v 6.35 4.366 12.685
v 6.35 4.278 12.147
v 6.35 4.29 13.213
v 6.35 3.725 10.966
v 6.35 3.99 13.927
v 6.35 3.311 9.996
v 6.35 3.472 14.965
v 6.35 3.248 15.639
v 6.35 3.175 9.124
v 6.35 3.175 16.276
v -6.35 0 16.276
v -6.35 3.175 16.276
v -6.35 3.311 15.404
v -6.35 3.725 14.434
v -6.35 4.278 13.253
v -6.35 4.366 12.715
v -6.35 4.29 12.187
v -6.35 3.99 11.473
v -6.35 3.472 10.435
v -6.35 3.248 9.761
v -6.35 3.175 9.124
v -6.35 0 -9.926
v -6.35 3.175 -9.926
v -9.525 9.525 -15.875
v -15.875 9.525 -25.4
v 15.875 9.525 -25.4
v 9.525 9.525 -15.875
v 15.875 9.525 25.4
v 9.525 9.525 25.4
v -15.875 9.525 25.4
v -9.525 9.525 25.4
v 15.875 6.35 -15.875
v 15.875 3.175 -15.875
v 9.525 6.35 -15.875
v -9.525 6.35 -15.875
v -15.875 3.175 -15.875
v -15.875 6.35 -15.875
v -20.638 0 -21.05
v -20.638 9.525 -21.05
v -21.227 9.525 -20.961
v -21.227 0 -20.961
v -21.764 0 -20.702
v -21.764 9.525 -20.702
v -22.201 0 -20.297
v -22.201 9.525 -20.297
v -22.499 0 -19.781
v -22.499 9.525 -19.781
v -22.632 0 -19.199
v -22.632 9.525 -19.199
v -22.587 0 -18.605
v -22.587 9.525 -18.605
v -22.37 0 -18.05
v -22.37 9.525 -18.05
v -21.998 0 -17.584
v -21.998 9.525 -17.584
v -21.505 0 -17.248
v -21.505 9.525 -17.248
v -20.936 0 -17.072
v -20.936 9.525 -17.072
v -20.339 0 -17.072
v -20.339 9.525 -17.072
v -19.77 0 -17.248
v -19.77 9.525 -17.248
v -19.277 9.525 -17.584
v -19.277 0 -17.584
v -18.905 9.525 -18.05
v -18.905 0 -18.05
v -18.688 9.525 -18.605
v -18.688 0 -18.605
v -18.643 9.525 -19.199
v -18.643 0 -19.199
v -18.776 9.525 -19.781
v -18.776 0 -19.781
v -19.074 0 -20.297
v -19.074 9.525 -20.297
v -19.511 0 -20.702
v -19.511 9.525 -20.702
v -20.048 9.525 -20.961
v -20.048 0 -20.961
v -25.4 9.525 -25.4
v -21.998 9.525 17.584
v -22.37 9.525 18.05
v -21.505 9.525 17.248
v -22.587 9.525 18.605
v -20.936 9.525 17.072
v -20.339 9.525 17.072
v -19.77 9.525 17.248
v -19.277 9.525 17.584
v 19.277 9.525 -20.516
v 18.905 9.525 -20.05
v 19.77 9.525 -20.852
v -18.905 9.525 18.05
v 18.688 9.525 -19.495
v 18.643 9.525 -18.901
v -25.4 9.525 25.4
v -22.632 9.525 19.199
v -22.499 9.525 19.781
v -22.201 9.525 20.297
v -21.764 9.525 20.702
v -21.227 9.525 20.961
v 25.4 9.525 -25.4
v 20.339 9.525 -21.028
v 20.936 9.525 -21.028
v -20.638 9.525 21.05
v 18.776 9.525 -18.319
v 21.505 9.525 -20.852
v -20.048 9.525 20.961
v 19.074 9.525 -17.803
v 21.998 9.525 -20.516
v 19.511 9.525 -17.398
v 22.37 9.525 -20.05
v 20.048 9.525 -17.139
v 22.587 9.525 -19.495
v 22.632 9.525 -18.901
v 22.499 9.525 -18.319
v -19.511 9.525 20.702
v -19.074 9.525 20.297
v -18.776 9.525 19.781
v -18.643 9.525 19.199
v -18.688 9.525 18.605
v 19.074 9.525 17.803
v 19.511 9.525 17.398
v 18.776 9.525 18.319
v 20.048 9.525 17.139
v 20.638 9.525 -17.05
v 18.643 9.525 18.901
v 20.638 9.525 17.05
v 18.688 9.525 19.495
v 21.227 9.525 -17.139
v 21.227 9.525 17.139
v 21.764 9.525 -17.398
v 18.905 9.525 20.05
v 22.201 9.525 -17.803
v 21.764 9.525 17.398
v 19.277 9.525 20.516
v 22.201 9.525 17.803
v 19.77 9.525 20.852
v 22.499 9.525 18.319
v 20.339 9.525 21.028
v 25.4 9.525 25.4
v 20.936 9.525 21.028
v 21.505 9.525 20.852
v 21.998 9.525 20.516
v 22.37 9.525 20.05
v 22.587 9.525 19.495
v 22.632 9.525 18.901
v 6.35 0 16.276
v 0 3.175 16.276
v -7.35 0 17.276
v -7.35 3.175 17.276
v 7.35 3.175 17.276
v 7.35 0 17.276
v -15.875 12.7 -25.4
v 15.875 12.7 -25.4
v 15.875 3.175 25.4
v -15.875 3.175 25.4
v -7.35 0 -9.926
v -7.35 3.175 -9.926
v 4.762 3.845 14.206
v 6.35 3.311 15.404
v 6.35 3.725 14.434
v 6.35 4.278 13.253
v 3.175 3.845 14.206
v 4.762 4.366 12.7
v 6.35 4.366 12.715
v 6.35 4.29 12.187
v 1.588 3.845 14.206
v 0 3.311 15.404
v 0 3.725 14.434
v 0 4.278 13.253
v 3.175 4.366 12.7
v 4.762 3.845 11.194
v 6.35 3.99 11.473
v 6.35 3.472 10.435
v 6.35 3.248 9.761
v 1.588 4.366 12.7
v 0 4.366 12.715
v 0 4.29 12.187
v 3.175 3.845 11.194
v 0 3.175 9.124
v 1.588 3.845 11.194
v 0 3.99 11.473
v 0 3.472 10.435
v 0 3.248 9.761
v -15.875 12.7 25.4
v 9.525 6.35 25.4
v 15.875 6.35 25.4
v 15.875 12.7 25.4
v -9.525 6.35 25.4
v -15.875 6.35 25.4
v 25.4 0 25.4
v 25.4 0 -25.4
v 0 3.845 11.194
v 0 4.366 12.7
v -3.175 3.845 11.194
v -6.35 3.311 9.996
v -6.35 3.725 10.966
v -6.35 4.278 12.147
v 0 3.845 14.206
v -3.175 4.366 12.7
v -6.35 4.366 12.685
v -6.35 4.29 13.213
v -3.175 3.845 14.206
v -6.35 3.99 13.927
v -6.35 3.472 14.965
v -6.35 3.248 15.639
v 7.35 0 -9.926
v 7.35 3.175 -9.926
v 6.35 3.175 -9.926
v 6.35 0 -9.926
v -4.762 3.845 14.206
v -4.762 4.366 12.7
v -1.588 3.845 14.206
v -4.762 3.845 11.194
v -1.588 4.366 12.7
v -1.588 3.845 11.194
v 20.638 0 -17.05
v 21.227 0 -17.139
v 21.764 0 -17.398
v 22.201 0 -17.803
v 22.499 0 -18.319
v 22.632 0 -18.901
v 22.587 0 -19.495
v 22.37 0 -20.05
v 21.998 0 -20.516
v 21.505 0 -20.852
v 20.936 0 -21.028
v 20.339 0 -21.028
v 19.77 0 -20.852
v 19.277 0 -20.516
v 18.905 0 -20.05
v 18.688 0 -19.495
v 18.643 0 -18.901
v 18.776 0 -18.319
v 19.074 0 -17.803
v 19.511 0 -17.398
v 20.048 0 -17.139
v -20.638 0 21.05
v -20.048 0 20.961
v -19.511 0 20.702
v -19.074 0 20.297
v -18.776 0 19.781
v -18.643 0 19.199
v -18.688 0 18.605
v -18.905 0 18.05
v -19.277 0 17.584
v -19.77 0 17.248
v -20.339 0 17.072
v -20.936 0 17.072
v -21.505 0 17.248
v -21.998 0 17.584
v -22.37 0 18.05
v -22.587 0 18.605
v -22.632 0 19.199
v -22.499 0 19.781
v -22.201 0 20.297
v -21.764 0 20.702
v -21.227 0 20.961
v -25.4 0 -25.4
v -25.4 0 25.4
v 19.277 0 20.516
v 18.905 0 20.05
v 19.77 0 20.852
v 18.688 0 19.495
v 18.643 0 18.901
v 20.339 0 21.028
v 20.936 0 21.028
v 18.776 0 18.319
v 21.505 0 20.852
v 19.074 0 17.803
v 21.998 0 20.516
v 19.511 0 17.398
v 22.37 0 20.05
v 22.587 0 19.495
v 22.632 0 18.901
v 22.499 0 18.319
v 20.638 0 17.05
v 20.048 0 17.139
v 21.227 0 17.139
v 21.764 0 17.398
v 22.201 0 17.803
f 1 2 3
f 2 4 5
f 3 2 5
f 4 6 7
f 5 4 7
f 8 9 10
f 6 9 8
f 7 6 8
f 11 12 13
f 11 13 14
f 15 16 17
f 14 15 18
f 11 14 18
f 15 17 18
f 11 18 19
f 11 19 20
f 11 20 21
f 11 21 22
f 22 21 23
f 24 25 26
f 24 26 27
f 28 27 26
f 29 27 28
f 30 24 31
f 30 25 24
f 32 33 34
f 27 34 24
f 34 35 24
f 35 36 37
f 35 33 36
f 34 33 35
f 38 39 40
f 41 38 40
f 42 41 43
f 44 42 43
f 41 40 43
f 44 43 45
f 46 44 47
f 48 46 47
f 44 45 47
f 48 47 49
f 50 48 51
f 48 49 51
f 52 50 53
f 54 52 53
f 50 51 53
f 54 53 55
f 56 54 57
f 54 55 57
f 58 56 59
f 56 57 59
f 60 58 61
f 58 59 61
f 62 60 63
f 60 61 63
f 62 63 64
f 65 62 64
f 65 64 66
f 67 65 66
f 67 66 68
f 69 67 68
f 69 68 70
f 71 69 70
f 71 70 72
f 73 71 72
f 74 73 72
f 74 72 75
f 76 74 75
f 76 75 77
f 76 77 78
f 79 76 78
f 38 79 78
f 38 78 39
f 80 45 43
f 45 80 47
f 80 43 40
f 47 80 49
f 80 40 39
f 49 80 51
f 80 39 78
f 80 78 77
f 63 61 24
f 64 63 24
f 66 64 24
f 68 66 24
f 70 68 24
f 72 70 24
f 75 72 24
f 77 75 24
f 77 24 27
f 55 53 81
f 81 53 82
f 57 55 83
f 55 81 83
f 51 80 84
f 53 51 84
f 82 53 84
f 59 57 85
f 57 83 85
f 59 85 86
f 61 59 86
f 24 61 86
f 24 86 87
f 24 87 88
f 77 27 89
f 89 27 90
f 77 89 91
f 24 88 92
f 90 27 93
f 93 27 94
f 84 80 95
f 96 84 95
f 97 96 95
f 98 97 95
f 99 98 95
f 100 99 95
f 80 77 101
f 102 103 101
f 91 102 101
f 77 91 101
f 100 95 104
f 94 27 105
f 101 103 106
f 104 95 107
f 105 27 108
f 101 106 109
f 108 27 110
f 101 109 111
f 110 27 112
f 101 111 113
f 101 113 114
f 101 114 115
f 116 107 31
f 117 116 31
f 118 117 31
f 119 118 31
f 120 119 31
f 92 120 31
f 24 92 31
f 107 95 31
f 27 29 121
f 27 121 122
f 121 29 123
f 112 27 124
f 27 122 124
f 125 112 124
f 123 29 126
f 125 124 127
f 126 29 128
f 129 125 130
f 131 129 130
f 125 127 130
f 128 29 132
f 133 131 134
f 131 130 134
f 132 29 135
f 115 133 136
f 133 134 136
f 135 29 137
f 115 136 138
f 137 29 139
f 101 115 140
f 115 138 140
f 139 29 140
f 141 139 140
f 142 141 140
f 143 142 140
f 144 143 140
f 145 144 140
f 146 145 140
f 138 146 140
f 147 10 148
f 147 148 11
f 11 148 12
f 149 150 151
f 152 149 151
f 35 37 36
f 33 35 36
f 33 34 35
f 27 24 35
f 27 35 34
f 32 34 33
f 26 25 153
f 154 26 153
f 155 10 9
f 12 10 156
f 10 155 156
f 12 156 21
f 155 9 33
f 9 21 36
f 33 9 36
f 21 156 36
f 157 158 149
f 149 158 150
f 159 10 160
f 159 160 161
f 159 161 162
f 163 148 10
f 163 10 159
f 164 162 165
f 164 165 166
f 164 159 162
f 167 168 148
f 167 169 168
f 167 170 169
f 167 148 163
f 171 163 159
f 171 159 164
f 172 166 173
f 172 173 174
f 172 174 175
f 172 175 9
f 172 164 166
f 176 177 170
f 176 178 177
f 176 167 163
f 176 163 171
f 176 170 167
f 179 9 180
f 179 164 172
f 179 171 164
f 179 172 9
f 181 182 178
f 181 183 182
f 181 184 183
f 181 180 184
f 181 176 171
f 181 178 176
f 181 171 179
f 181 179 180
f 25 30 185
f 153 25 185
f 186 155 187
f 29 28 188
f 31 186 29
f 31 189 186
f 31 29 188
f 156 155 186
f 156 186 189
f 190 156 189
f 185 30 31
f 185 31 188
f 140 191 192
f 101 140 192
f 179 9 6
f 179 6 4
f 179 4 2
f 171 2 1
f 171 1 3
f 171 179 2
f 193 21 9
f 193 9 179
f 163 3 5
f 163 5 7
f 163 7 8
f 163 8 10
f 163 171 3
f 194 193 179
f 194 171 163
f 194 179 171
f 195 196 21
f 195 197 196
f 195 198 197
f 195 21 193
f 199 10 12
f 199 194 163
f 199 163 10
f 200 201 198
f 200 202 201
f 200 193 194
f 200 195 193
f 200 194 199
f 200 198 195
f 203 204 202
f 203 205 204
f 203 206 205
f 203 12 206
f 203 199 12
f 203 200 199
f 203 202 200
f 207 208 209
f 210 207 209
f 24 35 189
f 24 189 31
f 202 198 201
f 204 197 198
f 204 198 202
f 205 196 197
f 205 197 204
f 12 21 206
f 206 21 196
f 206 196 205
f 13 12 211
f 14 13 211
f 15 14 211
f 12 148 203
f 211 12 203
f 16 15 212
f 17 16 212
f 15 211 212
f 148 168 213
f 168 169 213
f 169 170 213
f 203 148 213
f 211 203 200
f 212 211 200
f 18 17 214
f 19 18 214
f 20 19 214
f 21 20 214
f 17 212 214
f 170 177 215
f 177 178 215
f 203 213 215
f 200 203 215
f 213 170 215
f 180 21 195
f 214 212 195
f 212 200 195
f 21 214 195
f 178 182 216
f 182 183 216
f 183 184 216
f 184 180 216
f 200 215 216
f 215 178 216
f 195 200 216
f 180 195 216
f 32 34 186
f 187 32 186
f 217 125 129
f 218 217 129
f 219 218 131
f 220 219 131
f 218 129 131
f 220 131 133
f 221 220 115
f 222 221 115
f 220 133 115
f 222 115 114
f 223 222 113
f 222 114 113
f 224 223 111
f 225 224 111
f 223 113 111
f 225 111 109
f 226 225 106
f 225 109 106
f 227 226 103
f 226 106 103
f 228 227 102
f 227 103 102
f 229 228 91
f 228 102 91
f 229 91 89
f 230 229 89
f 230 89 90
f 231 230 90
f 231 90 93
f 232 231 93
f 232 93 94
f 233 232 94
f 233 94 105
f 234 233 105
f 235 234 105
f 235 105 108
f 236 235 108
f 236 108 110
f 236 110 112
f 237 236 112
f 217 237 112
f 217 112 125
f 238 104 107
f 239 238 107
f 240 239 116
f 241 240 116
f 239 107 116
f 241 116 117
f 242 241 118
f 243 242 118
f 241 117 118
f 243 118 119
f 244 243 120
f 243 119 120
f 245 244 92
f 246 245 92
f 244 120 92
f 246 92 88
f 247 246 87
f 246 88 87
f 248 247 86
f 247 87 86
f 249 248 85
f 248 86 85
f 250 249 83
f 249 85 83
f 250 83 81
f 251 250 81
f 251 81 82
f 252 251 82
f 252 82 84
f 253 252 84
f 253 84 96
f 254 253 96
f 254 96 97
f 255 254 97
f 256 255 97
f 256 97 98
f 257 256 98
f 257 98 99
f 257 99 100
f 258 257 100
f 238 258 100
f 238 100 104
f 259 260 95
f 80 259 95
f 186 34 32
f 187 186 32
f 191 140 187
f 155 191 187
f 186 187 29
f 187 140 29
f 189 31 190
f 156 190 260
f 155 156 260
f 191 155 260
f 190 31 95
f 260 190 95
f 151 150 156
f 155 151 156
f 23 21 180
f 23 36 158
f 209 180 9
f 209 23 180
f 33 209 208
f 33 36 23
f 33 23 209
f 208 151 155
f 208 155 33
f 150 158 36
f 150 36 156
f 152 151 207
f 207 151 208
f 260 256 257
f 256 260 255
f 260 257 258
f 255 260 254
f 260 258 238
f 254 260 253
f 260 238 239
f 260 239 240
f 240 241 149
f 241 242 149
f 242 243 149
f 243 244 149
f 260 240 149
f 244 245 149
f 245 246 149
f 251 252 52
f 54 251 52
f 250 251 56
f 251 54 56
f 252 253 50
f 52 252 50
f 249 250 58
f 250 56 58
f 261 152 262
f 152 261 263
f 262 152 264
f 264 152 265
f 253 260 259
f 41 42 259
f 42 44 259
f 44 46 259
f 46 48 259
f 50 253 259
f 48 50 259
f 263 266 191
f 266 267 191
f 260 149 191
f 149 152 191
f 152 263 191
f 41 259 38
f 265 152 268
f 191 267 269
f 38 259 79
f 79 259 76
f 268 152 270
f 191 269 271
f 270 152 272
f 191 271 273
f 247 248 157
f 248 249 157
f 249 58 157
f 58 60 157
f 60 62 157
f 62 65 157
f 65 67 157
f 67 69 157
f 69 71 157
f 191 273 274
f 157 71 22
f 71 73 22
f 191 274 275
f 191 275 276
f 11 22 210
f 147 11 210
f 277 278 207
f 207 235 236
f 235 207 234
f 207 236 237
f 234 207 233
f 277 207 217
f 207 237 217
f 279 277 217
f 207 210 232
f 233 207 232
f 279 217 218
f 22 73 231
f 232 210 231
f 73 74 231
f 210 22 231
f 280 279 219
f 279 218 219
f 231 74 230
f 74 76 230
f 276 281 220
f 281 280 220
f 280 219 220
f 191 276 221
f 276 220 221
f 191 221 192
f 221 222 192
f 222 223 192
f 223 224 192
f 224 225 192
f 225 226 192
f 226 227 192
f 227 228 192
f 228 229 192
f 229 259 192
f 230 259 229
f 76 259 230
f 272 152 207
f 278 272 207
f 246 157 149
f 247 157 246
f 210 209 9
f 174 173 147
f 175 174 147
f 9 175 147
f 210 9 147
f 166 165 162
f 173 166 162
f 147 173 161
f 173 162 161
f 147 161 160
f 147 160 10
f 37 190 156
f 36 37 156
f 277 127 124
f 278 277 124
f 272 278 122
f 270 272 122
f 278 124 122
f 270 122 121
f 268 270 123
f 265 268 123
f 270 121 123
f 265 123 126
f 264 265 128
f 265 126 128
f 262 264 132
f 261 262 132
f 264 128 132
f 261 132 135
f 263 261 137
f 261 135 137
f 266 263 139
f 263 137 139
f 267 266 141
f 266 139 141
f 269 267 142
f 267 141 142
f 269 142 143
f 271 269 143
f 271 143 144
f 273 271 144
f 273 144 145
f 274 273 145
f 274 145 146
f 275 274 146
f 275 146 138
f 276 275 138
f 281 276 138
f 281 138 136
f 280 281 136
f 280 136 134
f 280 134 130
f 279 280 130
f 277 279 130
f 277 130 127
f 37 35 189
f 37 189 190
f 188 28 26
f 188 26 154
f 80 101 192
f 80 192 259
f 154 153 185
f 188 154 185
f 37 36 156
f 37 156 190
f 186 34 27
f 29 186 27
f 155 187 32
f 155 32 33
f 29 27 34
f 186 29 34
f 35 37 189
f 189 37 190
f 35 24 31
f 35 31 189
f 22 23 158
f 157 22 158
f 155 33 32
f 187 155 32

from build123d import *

# Parameters (mm, degrees)
SKETCH1_W              = 50.8
SKETCH1_H              = 50.8
BOSS_EXTRUDE1_DEPTH    = 3.175
BOSS_EXTRUDE5_DEPTH    = 6.35
CUT_EXTRUDE1_DEPTH     = 37.061067996
BOSS_EXTRUDE2_DEPTH    = 50.8
BOSS_EXTRUDE6_REACH    = 39.162
SKETCH10_W             = 50.8
SKETCH10_H             = 9.525
SKETCH12_R             = 2
CUT_EXTRUDE2_DEPTH     = 38.162422242
SKETCH15_W             = 31.75
SKETCH15_H             = 41.275
BOSS_EXTRUDE8_DEPTH    = 6.35
SKETCH16_W             = 31.75
SKETCH16_H             = 50.8
BOSS_EXTRUDE9_DEPTH    = 3.175
INTERSECT4_START       = -15.875
INTERSECT4_OUTLINE_W   = 3.175
INTERSECT4_OUTLINE_H   = 50.8
INTERSECT4_DEPTH       = 31.75
INTERSECT4_START_2     = -9.525
INTERSECT4_2_OUTLINE_W = 3.175
INTERSECT4_2_OUTLINE_H = 41.275
INTERSECT4_2_DEPTH     = 19.05
INTERSECT4_3_DEPTH     = 9.525
INTERSECT4_START_3     = 6.35
INTERSECT4_4_DEPTH     = 9.525
INTERSECT4_5_OUTLINE_R = 2
INTERSECT4_5_DEPTH     = 9.525
INTERSECT4_6_OUTLINE_W = 31.75
INTERSECT4_6_OUTLINE_H = 41.275
INTERSECT4_6_DEPTH     = 3.175


with BuildPart() as part:
    # Sketch1 → Boss-Extrude1 (new body)
    with BuildSketch(Plane(origin=(0, 0, 0), x_dir=(1, 0, 0), z_dir=(0, 1, 0))):
        Rectangle(SKETCH1_W, SKETCH1_H)
    extrude(amount=BOSS_EXTRUDE1_DEPTH)

    # Sketch7 → Boss-Extrude5 (add, symmetric)
    with BuildSketch(Plane(origin=(0, 0, 0), x_dir=(0, 0, -1), z_dir=(1, 0, 0))):
        with BuildLine():
            Line((-16.276050722, 3.175), (-9.123949278, 3.175))
            add(Edge.make_bspline(
                [(-16.276050722, 3.175), (-13.736050722, 3.175), (-12.7, 6.35), (-11.663949278, 3.175), (-9.123949278, 3.175)],
                knots=[0, 0, 0, 0, 0, 1, 1, 1, 1, 1], degree=4))
        make_face()
    extrude(amount=BOSS_EXTRUDE5_DEPTH, both=True)

    # Sketch8 → Cut-Extrude1 (cut, through all)
    with BuildSketch(Plane(origin=(0, 3.175, 0), x_dir=(1, 0, 0), z_dir=(0, 1, 0))):
        Polygon((-6.35, -16.276050722), (-6.35, -9.123949278), (-6.35, 9.926050722), (-7.35, 9.926050722), (-7.35, -9.123949278), (-7.35, -17.276050722), (7.35, -17.276050722), (7.35, -9.123949278), (7.35, 9.926050722), (6.35, 9.926050722), (6.35, -9.123949278), (6.35, -16.276050722), align=None)
    extrude(amount=-CUT_EXTRUDE1_DEPTH, mode=Mode.SUBTRACT)

    # Sketch3 → Boss-Extrude2 (add)
    with BuildSketch(Plane.XY.offset(25.4)):
        Polygon((-15.875, 3.175), (-25.4, 3.175), (-25.4, 9.525), (-9.525, 9.525), (-9.525, 6.35), (-15.875, 6.35), align=None)
        Polygon((9.525, 6.35), (15.875, 6.35), (15.875, 3.175), (25.4, 3.175), (25.4, 9.525), (9.525, 9.525), align=None)
    extrude(amount=-BOSS_EXTRUDE2_DEPTH)

    # Boss-Extrude6: up to this face of the body (flat: up to its plane)
    boss_extrude6_end = Plane(part.part.faces().sort_by_distance((0, 3.175, -1.076695791))[0])
    # Sketch10 → Boss-Extrude6 (add, up to the picked face)
    with BuildSketch(Plane(origin=(0, 9.525, 0), x_dir=(1, 0, 0), z_dir=(0, 1, 0)), mode=Mode.PRIVATE) as boss_extrude6_sk1:
        with Locations((0, 20.6375)):
            Rectangle(SKETCH10_W, SKETCH10_H)
    boss_extrude6_tool1 = split(extrude(boss_extrude6_sk1.sketch, amount=-BOSS_EXTRUDE6_REACH, mode=Mode.PRIVATE), bisect_by=boss_extrude6_end, keep=Keep.BOTH, mode=Mode.PRIVATE)
    add(boss_extrude6_tool1.solids().sort_by(Axis((0, 9.525, -20.6375), (0, -1, 0)))[0])

    # Sketch12 → Cut-Extrude2 (cut, through all)
    with BuildSketch(Plane(origin=(0, 9.525, 0), x_dir=(1, 0, 0), z_dir=(0, 1, 0))):
        with Locations(Location((-20.6375, -19.05, 0), (0, 0, 270))):
            Circle(SKETCH12_R)
        with Locations(Location((20.6375, -19.05, 0), (0, 0, 90))):
            Circle(SKETCH12_R)
        with Locations(Location((20.6375, 19.05, 0), (0, 0, 270))):
            Circle(SKETCH12_R)
        with Locations(Location((-20.6375, 19.05, 0), (0, 0, 90))):
            Circle(SKETCH12_R)
    extrude(amount=-CUT_EXTRUDE2_DEPTH, mode=Mode.SUBTRACT)


with BuildPart() as body_2:
    # Sketch15 → Boss-Extrude8 (new body)
    with BuildSketch(Plane(origin=(0, 3.175, 0), x_dir=(1, 0, 0), z_dir=(0, 1, 0))):
        with Locations((0, -4.7625)):
            Rectangle(SKETCH15_W, SKETCH15_H)
    extrude(amount=BOSS_EXTRUDE8_DEPTH)

    # Sketch16 → Boss-Extrude9 (add)
    with BuildSketch(Plane(origin=(0, 9.525, 0), x_dir=(1, 0, 0), z_dir=(0, 1, 0))):
        Rectangle(SKETCH16_W, SKETCH16_H)
    extrude(amount=BOSS_EXTRUDE9_DEPTH)


with BuildPart() as body_3:
    # Intersect4: read off the stored shape, not the designer's step
    # Intersect4 outline → Intersect4 (new body)
    with BuildSketch(Plane.YZ.offset(INTERSECT4_START)):
        with BuildLine():
            add(Edge.make_bspline(
                [(3.175, 9.123949278), (3.175, 11.663949278), (6.35, 12.7), (3.175, 13.736050722), (3.175, 16.276050722)],
                knots=[0, 0, 0, 0, 0, 1, 1, 1, 1, 1], degree=4))
            Line((3.175, 9.123949278), (3.175, -15.875))
            Line((3.175, -15.875), (6.35, -15.875))
            Line((6.35, -15.875), (6.35, 25.4))
            Line((6.35, 25.4), (3.175, 25.4))
            Line((3.175, 25.4), (3.175, 16.276050722))
        make_face()
        with Locations((11.1125, 0)):
            Rectangle(INTERSECT4_OUTLINE_W, INTERSECT4_OUTLINE_H)
    extrude(amount=INTERSECT4_DEPTH)

    # Intersect4 2 outline → Intersect4 2 (add)
    with BuildSketch(Plane.YZ.offset(INTERSECT4_START_2)):
        with Locations((7.9375, 4.7625)):
            Rectangle(INTERSECT4_2_OUTLINE_W, INTERSECT4_2_OUTLINE_H)
    extrude(amount=INTERSECT4_2_DEPTH)

    # Intersect4 3 outline → Intersect4 3 (add)
    with BuildSketch(Plane.YZ.offset(INTERSECT4_START)):
        with BuildLine():
            Line((3.175, 16.276050722), (3.175, 9.123949278))
            add(Edge.make_bspline(
                [(3.175, 9.123949278), (3.175, 11.663949278), (6.35, 12.7), (3.175, 13.736050722), (3.175, 16.276050722)],
                knots=[0, 0, 0, 0, 0, 1, 1, 1, 1, 1], degree=4))
        make_face()
    extrude(amount=INTERSECT4_3_DEPTH)

    # Intersect4 4 outline → Intersect4 4 (add)
    with BuildSketch(Plane.YZ.offset(INTERSECT4_START_3)):
        with BuildLine():
            Line((3.175, 16.276050722), (3.175, 9.123949278))
            add(Edge.make_bspline(
                [(3.175, 9.123949278), (3.175, 11.663949278), (6.35, 12.7), (3.175, 13.736050722), (3.175, 16.276050722)],
                knots=[0, 0, 0, 0, 0, 1, 1, 1, 1, 1], degree=4))
        make_face()
    extrude(amount=INTERSECT4_4_DEPTH)


with BuildPart() as body_4:
    # Intersect4 5 outline → Intersect4 5 (new body)
    with BuildSketch(Plane(origin=(0, 0, 0), x_dir=(1, 0, 0), z_dir=(0, 1, 0))):
        Polygon((-15.875, 15.875), (15.875, 15.875), (15.875, -25.4), (25.4, -25.4), (25.4, 25.4), (-25.4, 25.4), (-25.4, -25.4), (-15.875, -25.4), align=None)
        with Locations((-20.6375, -19.05)):
            Circle(INTERSECT4_5_OUTLINE_R, mode=Mode.SUBTRACT)
        with Locations((20.6375, -19.05)):
            Circle(INTERSECT4_5_OUTLINE_R, mode=Mode.SUBTRACT)
        with Locations((-20.6375, 19.05)):
            Circle(INTERSECT4_5_OUTLINE_R, mode=Mode.SUBTRACT)
        with Locations((20.6375, 19.05)):
            Circle(INTERSECT4_5_OUTLINE_R, mode=Mode.SUBTRACT)
    extrude(amount=INTERSECT4_5_DEPTH)

    # Intersect4 6 outline → Intersect4 6 (add)
    with BuildSketch(Plane(origin=(0, 0, 0), x_dir=(1, 0, 0), z_dir=(0, 1, 0))):
        with Locations((0, -4.7625)):
            Rectangle(INTERSECT4_6_OUTLINE_W, INTERSECT4_6_OUTLINE_H)
        Polygon((7.35, 9.926050722), (7.35, -17.276050722), (-7.35, -17.276050722), (-7.35, 9.926050722), (-6.35, 9.926050722), (-6.35, -16.276050722), (6.35, -16.276050722), (6.35, 9.926050722), align=None, mode=Mode.SUBTRACT)
    extrude(amount=INTERSECT4_6_DEPTH)


solid = Compound([part.part, body_3.part])
